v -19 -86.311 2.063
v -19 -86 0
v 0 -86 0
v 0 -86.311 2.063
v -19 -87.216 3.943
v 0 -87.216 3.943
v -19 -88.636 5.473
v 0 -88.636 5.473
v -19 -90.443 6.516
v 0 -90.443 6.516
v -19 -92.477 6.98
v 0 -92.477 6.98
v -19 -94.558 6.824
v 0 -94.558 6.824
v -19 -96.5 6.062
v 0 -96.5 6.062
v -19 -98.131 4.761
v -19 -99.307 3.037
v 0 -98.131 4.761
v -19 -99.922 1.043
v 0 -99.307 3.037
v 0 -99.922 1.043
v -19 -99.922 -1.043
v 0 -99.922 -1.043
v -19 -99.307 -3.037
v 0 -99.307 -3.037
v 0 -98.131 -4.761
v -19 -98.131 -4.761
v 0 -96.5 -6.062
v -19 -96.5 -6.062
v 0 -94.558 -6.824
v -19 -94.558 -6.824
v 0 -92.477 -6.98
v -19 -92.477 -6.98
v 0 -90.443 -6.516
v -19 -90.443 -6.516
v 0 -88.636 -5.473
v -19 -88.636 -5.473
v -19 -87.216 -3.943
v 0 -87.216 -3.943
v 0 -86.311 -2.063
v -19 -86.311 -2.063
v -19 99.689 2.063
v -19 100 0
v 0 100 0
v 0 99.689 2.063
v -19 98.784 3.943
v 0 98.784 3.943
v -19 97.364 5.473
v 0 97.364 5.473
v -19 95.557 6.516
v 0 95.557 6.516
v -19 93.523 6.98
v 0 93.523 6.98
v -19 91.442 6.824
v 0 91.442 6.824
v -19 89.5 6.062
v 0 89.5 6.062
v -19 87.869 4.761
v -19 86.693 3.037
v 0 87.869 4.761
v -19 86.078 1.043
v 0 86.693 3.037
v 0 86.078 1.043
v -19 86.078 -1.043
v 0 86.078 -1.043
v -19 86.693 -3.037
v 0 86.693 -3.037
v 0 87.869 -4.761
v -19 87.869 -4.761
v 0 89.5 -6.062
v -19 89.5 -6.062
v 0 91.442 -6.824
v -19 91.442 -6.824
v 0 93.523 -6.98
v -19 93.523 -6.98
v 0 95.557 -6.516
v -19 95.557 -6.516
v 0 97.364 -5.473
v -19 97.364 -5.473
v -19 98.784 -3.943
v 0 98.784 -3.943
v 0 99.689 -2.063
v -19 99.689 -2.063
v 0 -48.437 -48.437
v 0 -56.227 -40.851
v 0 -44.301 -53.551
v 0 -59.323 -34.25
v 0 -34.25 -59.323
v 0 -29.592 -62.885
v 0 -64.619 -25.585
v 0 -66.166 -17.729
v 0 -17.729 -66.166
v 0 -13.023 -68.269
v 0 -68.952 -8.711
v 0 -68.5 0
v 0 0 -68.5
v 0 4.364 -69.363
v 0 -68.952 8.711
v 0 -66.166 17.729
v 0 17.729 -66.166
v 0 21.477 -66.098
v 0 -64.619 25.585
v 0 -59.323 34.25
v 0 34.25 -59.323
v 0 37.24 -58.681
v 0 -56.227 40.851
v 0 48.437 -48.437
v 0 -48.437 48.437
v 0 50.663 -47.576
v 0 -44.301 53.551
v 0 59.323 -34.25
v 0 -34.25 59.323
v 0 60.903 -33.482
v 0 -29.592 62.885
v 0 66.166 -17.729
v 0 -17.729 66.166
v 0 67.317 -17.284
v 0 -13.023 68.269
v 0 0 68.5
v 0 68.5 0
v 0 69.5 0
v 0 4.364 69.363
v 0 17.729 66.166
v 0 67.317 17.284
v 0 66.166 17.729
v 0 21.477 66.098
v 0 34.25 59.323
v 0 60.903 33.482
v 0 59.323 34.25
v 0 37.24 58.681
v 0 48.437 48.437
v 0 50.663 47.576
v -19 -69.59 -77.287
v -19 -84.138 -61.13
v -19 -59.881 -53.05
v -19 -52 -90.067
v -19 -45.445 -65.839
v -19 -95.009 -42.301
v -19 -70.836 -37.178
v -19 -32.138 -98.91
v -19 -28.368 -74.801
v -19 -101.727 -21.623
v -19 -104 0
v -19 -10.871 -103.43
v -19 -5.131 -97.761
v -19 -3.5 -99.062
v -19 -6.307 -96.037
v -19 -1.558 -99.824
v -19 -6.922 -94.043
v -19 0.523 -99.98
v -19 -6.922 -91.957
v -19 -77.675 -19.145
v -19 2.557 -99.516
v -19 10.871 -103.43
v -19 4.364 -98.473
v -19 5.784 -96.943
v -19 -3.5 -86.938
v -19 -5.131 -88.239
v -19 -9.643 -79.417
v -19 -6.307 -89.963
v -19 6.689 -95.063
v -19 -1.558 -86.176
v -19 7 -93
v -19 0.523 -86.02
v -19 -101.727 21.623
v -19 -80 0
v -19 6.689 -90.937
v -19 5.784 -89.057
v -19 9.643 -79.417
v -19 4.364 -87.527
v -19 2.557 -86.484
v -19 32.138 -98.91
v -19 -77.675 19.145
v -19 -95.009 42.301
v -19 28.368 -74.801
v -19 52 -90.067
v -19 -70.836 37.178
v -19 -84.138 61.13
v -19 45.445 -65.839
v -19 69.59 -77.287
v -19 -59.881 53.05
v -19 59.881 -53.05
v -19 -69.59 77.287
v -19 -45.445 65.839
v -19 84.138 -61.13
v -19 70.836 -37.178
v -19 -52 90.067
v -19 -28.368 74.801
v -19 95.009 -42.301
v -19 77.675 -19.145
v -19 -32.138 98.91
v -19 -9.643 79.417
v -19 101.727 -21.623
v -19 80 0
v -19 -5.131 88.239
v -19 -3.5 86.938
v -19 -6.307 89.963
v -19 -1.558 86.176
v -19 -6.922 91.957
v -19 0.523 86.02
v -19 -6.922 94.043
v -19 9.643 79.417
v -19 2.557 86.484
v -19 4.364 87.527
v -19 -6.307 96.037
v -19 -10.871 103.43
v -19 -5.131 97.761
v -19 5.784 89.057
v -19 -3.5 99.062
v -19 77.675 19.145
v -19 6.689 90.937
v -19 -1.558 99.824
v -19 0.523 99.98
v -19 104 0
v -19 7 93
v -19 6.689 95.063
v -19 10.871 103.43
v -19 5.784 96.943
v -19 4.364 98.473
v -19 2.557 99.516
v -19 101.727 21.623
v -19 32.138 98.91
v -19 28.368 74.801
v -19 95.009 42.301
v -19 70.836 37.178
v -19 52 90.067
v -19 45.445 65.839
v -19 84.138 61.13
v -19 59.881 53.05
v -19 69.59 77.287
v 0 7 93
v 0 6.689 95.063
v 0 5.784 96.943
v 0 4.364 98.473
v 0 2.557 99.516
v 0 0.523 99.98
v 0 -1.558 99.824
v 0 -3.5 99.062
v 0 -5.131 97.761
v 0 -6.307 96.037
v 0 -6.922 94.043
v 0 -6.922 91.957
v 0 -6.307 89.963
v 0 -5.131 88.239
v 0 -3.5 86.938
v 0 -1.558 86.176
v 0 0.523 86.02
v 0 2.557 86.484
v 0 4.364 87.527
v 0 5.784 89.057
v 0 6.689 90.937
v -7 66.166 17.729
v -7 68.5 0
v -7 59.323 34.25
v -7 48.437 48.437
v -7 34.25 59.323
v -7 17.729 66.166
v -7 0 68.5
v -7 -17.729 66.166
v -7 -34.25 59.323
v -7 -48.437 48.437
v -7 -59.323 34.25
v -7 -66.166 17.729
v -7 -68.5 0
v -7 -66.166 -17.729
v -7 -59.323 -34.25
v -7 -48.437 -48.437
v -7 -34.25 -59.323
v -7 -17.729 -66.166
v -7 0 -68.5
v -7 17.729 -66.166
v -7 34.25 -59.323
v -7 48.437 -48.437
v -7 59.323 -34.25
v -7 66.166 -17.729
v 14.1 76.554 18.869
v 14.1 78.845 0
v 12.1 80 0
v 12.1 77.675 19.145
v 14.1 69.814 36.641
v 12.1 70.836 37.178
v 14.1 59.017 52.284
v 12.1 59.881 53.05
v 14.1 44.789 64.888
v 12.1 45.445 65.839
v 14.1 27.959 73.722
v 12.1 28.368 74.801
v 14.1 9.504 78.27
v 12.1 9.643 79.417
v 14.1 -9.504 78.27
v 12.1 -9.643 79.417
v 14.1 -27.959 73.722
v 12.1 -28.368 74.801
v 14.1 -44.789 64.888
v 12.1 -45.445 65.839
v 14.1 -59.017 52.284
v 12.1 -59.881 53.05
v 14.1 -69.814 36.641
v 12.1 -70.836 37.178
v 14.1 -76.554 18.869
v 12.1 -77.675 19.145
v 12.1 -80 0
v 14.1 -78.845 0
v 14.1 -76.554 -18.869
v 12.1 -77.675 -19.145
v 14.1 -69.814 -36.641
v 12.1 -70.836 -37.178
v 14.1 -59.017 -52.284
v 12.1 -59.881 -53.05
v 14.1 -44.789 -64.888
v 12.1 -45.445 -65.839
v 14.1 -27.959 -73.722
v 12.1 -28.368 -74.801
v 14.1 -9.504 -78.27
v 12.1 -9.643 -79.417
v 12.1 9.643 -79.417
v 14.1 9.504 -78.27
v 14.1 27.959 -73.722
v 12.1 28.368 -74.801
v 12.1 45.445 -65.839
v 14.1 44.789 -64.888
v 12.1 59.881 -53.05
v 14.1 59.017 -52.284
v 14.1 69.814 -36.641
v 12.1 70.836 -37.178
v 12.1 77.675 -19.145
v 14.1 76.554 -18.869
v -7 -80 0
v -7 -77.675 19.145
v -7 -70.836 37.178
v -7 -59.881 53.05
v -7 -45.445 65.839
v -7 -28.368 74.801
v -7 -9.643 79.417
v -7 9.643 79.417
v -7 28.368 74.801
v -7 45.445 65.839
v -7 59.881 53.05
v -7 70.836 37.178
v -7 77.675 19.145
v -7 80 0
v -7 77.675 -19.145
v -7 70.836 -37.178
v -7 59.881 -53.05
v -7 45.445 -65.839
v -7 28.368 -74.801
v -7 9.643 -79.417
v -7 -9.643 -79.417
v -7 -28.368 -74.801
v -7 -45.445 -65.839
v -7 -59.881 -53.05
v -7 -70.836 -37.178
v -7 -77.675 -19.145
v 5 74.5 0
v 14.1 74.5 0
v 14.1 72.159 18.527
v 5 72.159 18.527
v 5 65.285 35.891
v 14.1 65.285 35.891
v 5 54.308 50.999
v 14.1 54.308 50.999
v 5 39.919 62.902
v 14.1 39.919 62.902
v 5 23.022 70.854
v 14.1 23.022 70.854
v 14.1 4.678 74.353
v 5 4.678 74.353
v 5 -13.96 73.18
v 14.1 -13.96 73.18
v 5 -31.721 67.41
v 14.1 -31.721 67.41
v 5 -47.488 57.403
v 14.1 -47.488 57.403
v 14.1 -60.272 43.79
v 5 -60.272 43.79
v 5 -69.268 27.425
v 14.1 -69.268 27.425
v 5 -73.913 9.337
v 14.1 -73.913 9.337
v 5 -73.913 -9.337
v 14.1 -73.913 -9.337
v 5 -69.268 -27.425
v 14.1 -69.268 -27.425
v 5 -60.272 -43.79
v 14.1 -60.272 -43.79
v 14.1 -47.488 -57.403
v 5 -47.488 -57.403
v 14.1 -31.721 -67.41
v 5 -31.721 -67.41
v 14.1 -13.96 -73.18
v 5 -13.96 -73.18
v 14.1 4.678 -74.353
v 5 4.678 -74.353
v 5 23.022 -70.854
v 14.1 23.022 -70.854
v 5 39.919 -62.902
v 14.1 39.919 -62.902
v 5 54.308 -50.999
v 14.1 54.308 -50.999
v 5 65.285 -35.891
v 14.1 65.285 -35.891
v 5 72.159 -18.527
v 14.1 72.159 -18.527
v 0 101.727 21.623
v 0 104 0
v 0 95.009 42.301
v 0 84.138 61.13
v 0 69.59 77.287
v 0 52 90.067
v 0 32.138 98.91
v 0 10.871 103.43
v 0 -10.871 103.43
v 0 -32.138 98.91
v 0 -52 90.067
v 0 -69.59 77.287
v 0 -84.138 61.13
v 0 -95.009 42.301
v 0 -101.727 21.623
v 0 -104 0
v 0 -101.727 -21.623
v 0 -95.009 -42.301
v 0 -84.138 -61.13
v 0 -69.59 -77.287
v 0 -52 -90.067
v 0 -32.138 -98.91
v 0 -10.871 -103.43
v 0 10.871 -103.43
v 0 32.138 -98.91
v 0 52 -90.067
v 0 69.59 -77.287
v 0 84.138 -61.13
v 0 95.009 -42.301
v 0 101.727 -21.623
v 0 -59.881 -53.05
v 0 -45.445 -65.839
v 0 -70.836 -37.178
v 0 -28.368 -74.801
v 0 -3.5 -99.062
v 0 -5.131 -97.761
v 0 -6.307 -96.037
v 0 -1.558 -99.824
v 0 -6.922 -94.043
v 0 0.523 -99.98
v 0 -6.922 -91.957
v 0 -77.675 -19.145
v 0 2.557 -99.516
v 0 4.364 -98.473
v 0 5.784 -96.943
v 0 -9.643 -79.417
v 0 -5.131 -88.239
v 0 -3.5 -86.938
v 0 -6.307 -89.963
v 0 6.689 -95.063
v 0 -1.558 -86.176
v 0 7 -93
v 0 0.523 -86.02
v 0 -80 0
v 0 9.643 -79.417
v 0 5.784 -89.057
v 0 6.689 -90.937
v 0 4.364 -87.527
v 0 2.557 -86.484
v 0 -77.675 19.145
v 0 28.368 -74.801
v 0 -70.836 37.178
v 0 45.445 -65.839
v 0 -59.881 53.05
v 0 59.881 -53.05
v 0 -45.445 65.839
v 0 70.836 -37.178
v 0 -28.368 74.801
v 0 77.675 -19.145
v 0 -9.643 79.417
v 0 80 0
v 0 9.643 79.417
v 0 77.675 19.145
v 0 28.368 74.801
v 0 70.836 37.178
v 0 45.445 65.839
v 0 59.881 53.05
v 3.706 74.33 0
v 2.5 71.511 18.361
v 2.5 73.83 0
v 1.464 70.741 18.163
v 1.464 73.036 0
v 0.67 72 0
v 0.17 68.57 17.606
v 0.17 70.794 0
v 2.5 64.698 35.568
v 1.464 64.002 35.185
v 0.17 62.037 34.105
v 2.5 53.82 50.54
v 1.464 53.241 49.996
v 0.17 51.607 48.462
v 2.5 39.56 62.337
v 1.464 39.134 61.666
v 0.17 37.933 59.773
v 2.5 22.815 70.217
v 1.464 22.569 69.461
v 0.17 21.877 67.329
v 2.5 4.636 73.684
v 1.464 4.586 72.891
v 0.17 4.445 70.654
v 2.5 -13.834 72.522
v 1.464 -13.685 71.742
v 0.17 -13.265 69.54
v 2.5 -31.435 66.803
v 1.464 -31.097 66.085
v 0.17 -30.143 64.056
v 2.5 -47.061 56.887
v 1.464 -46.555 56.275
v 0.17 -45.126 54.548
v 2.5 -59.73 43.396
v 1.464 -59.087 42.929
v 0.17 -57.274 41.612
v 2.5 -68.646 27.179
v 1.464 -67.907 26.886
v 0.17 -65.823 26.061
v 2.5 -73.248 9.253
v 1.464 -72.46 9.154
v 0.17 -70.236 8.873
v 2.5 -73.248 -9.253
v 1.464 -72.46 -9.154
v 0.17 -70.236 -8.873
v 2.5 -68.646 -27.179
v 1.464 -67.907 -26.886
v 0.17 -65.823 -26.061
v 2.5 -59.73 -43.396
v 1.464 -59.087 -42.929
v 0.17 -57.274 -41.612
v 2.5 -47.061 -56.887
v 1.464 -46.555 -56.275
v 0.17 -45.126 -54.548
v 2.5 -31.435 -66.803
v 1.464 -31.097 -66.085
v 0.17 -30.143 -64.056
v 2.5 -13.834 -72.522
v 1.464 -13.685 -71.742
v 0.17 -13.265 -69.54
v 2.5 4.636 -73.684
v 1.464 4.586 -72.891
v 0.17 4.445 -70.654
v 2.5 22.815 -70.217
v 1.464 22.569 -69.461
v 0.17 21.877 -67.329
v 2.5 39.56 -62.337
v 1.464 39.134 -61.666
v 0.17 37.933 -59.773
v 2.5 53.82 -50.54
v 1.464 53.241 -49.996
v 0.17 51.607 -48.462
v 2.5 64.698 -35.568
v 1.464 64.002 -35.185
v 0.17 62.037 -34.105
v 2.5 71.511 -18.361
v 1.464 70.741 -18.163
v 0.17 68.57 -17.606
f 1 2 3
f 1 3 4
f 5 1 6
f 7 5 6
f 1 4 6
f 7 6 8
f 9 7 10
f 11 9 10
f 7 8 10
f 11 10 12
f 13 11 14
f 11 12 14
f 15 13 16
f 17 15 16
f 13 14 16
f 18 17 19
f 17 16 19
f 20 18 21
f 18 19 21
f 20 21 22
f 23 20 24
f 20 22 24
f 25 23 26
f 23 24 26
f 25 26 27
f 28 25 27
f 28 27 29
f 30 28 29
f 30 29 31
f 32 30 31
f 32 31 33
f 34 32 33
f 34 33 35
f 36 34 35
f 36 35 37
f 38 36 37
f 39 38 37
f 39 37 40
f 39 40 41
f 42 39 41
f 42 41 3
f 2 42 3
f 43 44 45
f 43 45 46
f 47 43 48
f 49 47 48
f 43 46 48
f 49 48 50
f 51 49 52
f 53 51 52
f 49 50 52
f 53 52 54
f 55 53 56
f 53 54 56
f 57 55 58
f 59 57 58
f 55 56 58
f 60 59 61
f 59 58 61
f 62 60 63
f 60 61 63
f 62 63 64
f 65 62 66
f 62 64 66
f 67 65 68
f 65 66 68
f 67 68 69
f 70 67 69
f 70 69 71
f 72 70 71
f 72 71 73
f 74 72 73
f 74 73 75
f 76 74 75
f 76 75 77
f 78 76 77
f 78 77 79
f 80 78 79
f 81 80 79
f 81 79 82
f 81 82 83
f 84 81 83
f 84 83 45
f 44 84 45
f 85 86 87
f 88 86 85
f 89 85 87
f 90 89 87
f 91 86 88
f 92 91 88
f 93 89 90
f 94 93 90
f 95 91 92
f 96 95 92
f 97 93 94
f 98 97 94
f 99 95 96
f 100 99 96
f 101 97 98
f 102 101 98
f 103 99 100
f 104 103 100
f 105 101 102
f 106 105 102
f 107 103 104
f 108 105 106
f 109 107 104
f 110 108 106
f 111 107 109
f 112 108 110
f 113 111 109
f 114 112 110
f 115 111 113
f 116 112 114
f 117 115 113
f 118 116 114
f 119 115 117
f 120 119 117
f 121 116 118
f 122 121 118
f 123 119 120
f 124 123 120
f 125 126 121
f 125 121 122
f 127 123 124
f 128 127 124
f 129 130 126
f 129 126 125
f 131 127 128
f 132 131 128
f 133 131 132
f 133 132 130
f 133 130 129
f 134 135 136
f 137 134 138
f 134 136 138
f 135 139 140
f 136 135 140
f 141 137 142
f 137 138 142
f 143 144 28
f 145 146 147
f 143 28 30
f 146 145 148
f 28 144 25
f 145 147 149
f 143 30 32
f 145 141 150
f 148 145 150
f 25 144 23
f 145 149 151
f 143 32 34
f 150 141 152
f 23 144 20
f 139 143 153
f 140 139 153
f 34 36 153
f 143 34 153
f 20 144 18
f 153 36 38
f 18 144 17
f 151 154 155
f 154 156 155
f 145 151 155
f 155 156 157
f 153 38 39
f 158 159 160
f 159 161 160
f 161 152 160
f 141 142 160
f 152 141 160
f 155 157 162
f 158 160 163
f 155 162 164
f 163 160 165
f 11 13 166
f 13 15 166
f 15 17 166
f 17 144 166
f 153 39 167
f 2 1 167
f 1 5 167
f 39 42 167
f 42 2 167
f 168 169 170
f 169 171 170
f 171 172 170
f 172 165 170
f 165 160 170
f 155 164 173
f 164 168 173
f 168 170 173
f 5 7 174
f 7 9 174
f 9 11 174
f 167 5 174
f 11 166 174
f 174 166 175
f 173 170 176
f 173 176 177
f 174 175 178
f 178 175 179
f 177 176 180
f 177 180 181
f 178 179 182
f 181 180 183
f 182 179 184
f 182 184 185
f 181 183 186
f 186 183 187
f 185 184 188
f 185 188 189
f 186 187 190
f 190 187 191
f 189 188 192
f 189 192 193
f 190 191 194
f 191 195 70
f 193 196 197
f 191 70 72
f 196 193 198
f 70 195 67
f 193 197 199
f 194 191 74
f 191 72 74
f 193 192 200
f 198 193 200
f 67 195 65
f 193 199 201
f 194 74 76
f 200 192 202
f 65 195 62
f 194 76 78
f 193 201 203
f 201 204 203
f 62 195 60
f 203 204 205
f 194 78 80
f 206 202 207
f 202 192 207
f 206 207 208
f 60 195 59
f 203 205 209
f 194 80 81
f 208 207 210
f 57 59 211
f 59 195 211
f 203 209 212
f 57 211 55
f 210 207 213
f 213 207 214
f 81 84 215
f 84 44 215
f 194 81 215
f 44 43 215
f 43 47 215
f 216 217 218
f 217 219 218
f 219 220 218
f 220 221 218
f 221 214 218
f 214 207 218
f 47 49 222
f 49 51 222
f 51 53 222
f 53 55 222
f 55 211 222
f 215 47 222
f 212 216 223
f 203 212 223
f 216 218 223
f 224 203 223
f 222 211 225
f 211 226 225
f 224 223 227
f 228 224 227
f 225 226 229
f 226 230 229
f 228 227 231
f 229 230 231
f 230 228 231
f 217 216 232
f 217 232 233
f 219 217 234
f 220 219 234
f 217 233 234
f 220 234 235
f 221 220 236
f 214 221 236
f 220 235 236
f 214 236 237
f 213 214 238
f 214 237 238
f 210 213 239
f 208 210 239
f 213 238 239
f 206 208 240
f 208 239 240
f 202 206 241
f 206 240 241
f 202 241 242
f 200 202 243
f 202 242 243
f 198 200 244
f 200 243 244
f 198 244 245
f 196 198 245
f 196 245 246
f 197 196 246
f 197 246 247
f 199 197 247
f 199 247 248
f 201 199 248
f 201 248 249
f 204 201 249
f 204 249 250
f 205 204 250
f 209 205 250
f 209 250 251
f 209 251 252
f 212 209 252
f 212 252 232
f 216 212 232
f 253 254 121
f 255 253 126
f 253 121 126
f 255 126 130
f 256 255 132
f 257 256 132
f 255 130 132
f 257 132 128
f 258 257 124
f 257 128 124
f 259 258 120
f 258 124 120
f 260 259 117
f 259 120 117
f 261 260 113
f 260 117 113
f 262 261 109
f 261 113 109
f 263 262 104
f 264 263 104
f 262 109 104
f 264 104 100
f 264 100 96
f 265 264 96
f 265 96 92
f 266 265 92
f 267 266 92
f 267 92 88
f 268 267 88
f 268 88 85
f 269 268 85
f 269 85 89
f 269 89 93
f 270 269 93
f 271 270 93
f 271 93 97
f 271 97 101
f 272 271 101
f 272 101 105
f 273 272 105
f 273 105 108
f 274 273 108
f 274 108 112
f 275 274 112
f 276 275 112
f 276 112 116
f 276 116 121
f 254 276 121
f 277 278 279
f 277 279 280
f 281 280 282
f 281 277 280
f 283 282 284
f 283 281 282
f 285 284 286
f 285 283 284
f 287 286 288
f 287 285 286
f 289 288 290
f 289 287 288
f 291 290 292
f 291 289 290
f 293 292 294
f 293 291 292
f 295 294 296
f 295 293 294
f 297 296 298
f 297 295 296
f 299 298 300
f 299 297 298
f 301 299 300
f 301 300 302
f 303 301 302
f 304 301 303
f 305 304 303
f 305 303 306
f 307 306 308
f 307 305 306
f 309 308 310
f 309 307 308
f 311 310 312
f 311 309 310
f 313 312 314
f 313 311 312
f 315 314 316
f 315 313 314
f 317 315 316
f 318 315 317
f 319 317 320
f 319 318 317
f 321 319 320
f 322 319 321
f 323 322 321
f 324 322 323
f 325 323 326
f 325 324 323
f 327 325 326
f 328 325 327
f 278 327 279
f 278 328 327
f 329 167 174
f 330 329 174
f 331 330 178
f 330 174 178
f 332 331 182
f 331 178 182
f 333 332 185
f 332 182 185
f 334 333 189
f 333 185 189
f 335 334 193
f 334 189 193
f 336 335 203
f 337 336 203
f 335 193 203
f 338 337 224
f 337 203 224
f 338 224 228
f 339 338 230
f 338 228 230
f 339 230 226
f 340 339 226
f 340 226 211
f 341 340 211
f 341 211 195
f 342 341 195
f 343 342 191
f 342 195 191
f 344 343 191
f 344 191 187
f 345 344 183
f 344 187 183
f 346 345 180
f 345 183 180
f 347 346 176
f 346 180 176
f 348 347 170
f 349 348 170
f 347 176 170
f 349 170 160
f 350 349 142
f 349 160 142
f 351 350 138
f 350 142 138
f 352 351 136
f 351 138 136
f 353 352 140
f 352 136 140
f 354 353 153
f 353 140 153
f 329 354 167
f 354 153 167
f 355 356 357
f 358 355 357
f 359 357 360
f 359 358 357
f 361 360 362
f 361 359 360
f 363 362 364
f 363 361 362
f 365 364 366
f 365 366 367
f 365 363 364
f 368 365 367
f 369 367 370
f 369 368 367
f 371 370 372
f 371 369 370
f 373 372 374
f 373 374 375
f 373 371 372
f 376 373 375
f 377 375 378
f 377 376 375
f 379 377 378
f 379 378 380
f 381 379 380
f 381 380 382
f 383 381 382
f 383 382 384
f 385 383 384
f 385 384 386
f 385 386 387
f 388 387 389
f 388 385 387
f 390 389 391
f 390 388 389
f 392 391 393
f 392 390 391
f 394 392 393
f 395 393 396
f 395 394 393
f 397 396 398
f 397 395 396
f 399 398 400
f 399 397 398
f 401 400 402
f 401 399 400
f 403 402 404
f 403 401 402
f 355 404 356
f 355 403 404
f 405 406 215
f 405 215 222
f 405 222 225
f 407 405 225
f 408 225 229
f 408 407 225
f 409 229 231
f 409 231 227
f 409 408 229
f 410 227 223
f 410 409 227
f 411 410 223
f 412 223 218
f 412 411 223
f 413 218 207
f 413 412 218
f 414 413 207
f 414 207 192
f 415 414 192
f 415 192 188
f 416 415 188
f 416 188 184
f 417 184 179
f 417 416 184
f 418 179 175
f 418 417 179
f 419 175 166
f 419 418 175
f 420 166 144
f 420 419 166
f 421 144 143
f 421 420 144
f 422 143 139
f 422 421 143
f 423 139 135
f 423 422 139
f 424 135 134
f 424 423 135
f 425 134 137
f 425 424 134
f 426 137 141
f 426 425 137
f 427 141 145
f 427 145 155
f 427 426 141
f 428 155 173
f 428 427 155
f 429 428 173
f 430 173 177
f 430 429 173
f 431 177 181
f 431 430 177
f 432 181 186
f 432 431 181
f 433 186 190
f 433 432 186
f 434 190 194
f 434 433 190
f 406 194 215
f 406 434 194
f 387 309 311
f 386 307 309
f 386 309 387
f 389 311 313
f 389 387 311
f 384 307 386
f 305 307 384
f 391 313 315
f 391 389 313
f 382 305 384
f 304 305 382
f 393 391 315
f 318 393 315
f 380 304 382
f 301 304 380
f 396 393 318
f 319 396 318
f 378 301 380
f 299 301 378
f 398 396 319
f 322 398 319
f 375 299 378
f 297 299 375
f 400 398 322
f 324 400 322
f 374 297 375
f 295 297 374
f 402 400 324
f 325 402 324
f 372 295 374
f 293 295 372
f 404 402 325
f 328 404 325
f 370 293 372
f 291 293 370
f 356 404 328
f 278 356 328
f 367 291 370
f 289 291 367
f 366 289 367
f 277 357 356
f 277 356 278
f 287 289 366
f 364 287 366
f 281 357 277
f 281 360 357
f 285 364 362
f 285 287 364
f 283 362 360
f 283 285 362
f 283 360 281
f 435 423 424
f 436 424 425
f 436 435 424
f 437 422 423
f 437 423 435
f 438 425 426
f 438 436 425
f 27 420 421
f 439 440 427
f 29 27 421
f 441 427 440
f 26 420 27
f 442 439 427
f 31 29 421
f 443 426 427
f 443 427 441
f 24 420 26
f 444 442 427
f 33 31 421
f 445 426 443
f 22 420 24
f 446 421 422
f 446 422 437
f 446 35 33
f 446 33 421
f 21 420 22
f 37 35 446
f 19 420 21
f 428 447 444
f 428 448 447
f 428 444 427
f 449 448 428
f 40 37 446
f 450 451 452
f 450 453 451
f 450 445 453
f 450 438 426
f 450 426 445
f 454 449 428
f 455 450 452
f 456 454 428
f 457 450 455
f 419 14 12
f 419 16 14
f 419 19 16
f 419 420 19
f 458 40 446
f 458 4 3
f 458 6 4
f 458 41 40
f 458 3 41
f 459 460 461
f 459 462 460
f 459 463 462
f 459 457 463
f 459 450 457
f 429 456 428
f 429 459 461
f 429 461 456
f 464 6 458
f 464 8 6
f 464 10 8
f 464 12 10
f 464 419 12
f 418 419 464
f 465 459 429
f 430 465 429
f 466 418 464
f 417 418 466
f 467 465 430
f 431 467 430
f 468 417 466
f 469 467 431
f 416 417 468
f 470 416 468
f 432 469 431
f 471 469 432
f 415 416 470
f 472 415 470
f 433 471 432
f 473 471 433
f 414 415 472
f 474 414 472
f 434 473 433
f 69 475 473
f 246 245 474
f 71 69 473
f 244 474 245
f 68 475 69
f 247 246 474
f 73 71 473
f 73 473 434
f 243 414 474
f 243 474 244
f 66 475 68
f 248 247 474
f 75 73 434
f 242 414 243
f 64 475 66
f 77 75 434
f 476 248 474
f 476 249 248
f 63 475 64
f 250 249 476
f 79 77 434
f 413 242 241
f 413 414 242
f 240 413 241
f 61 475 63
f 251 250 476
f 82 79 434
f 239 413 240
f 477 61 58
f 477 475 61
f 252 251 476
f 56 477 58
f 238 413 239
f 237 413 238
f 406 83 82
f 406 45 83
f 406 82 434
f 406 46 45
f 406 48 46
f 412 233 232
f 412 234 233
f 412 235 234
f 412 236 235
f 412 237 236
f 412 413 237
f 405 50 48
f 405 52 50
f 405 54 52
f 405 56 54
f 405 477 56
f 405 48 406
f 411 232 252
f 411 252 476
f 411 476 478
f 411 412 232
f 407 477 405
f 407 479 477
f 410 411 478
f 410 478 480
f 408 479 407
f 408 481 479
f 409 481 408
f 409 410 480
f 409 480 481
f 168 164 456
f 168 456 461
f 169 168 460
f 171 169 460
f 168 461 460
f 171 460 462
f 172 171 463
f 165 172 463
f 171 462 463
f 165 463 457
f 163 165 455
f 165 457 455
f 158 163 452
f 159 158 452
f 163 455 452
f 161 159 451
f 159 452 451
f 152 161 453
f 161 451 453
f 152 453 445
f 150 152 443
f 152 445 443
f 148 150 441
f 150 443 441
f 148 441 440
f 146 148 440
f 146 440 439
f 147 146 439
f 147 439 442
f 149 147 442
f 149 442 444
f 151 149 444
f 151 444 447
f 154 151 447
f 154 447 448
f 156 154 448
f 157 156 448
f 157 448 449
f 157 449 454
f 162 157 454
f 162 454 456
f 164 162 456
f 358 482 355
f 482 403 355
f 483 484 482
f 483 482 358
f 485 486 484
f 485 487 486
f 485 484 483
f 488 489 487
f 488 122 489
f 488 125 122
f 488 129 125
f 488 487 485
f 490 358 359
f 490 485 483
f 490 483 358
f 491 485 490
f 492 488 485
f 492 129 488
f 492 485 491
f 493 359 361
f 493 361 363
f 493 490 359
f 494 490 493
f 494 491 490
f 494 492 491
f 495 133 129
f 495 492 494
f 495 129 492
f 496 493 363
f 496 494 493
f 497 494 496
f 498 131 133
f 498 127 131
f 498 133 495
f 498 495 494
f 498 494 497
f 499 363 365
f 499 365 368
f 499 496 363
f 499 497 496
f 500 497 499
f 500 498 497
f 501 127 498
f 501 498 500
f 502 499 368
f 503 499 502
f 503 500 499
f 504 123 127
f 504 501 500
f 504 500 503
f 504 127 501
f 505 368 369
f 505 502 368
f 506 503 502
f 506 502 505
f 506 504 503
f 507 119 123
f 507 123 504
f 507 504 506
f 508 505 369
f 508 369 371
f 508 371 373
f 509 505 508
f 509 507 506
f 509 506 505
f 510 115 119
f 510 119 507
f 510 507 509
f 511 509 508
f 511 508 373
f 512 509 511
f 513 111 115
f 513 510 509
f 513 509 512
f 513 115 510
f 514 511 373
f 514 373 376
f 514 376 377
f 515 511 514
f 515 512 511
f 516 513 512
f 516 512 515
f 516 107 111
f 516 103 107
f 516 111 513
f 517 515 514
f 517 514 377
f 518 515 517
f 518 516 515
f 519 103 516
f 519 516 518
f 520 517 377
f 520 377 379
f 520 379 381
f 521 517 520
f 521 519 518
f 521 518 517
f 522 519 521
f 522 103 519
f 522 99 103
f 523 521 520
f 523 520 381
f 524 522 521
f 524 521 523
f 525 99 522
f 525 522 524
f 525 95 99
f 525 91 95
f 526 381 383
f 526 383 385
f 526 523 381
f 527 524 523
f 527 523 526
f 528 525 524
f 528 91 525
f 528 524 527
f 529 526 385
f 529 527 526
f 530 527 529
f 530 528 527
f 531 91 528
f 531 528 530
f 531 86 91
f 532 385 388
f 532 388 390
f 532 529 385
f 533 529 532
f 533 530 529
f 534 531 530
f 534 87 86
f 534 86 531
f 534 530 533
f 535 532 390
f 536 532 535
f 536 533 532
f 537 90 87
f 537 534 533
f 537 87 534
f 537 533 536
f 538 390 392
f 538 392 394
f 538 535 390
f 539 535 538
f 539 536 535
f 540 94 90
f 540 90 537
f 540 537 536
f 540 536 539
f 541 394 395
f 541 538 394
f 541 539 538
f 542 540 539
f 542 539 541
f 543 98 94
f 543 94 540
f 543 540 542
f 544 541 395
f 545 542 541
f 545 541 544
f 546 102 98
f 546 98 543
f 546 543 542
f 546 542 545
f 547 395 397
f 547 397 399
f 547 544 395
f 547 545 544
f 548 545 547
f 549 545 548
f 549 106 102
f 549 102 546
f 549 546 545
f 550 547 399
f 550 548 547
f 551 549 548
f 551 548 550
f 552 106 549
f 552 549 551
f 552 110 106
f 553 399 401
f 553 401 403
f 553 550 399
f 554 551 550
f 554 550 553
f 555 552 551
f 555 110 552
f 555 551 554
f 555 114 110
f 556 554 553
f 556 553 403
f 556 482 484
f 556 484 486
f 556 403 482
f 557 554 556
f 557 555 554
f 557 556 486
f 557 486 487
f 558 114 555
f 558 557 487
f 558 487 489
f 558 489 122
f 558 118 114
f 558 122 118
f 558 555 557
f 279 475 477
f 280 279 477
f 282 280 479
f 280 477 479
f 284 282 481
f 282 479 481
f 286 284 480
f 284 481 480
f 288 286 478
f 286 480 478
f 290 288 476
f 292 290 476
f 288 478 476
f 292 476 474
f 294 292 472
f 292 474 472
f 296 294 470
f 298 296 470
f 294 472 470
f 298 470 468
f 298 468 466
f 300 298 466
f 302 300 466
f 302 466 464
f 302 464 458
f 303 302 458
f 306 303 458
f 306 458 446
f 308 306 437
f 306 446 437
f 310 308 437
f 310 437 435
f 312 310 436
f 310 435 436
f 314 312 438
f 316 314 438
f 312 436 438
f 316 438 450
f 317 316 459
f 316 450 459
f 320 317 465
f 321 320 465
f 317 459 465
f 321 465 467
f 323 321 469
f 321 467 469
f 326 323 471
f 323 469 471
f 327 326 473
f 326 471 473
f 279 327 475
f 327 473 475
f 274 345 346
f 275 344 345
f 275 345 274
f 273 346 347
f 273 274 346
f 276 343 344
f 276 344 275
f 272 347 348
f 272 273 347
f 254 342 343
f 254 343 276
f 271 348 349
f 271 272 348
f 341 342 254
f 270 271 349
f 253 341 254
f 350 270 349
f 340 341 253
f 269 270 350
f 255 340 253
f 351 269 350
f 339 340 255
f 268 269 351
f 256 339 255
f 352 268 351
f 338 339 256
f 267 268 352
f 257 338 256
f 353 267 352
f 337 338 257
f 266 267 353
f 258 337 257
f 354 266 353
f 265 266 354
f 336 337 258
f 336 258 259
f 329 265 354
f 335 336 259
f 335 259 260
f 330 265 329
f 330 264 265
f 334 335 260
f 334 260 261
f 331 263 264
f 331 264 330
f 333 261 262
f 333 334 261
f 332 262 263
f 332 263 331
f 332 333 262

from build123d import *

# Parameters (mm, degrees)
F0_R     = 104
F0_R_2   = 68.5
F1_DEPTH = 19
F2_R     = 80
F2_R_2   = 74.5
F3_DEPTH = 14.1
F4_R     = 80
F5_DEPTH = 12
F6_SIZE2 = 1.1547005384
F6_SIZE  = 2
F7_R     = 5
F9_D     = 14
F9_DEPTH = 25.5
F9_TIP   = 4.2060243332


with BuildPart() as f1:
    # F0 (on Right) → F1 (new body)
    with BuildSketch(Plane.YZ):
        Circle(F0_R)
        Circle(F0_R_2, mode=Mode.SUBTRACT)
    extrude(amount=-F1_DEPTH)

    # F2 (on face) → F3 (join)
    with BuildSketch(Plane.YZ):
        Circle(F2_R)
        Circle(F2_R_2, mode=Mode.SUBTRACT)
    extrude(amount=F3_DEPTH)

    # F4 (on face) → F5 (cut)
    with BuildSketch(Plane(origin=(-19, 0, 0), x_dir=(0, -1, 0), z_dir=(-1, 0, 0))):
        Circle(F4_R)
    extrude(amount=-F5_DEPTH, mode=Mode.SUBTRACT)

    # F6
    f6_edges = [f1.edges().sort_by_distance(p)[0] for p in [
        (14.1, -80, 0),
    ]]
    f6_side = f1.faces().sort_by_distance((7.05, -80, 0))[0]
    chamfer(f6_edges, length=F6_SIZE, length2=F6_SIZE2, reference=f6_side)

    # F7
    f7_edges = [f1.edges().sort_by_distance(p)[0] for p in [
        (0, -74.5, 0),
    ]]
    fillet(f7_edges, radius=F7_R)

    # F9
    with Locations(Plane(origin=(-19, 0, 0), x_dir=(0, -1, 0), z_dir=(-1, 0, 0))):
        with Locations((0, -93), (-93, 0), (0, 93), (93, 0)):
            Hole(F9_D / 2, depth=F9_DEPTH)
            with Locations((0, 0, -(F9_DEPTH + F9_TIP / 2))):  # 118° drill point
                Cone(0, F9_D / 2, F9_TIP, mode=Mode.SUBTRACT)


solid = f1.part
